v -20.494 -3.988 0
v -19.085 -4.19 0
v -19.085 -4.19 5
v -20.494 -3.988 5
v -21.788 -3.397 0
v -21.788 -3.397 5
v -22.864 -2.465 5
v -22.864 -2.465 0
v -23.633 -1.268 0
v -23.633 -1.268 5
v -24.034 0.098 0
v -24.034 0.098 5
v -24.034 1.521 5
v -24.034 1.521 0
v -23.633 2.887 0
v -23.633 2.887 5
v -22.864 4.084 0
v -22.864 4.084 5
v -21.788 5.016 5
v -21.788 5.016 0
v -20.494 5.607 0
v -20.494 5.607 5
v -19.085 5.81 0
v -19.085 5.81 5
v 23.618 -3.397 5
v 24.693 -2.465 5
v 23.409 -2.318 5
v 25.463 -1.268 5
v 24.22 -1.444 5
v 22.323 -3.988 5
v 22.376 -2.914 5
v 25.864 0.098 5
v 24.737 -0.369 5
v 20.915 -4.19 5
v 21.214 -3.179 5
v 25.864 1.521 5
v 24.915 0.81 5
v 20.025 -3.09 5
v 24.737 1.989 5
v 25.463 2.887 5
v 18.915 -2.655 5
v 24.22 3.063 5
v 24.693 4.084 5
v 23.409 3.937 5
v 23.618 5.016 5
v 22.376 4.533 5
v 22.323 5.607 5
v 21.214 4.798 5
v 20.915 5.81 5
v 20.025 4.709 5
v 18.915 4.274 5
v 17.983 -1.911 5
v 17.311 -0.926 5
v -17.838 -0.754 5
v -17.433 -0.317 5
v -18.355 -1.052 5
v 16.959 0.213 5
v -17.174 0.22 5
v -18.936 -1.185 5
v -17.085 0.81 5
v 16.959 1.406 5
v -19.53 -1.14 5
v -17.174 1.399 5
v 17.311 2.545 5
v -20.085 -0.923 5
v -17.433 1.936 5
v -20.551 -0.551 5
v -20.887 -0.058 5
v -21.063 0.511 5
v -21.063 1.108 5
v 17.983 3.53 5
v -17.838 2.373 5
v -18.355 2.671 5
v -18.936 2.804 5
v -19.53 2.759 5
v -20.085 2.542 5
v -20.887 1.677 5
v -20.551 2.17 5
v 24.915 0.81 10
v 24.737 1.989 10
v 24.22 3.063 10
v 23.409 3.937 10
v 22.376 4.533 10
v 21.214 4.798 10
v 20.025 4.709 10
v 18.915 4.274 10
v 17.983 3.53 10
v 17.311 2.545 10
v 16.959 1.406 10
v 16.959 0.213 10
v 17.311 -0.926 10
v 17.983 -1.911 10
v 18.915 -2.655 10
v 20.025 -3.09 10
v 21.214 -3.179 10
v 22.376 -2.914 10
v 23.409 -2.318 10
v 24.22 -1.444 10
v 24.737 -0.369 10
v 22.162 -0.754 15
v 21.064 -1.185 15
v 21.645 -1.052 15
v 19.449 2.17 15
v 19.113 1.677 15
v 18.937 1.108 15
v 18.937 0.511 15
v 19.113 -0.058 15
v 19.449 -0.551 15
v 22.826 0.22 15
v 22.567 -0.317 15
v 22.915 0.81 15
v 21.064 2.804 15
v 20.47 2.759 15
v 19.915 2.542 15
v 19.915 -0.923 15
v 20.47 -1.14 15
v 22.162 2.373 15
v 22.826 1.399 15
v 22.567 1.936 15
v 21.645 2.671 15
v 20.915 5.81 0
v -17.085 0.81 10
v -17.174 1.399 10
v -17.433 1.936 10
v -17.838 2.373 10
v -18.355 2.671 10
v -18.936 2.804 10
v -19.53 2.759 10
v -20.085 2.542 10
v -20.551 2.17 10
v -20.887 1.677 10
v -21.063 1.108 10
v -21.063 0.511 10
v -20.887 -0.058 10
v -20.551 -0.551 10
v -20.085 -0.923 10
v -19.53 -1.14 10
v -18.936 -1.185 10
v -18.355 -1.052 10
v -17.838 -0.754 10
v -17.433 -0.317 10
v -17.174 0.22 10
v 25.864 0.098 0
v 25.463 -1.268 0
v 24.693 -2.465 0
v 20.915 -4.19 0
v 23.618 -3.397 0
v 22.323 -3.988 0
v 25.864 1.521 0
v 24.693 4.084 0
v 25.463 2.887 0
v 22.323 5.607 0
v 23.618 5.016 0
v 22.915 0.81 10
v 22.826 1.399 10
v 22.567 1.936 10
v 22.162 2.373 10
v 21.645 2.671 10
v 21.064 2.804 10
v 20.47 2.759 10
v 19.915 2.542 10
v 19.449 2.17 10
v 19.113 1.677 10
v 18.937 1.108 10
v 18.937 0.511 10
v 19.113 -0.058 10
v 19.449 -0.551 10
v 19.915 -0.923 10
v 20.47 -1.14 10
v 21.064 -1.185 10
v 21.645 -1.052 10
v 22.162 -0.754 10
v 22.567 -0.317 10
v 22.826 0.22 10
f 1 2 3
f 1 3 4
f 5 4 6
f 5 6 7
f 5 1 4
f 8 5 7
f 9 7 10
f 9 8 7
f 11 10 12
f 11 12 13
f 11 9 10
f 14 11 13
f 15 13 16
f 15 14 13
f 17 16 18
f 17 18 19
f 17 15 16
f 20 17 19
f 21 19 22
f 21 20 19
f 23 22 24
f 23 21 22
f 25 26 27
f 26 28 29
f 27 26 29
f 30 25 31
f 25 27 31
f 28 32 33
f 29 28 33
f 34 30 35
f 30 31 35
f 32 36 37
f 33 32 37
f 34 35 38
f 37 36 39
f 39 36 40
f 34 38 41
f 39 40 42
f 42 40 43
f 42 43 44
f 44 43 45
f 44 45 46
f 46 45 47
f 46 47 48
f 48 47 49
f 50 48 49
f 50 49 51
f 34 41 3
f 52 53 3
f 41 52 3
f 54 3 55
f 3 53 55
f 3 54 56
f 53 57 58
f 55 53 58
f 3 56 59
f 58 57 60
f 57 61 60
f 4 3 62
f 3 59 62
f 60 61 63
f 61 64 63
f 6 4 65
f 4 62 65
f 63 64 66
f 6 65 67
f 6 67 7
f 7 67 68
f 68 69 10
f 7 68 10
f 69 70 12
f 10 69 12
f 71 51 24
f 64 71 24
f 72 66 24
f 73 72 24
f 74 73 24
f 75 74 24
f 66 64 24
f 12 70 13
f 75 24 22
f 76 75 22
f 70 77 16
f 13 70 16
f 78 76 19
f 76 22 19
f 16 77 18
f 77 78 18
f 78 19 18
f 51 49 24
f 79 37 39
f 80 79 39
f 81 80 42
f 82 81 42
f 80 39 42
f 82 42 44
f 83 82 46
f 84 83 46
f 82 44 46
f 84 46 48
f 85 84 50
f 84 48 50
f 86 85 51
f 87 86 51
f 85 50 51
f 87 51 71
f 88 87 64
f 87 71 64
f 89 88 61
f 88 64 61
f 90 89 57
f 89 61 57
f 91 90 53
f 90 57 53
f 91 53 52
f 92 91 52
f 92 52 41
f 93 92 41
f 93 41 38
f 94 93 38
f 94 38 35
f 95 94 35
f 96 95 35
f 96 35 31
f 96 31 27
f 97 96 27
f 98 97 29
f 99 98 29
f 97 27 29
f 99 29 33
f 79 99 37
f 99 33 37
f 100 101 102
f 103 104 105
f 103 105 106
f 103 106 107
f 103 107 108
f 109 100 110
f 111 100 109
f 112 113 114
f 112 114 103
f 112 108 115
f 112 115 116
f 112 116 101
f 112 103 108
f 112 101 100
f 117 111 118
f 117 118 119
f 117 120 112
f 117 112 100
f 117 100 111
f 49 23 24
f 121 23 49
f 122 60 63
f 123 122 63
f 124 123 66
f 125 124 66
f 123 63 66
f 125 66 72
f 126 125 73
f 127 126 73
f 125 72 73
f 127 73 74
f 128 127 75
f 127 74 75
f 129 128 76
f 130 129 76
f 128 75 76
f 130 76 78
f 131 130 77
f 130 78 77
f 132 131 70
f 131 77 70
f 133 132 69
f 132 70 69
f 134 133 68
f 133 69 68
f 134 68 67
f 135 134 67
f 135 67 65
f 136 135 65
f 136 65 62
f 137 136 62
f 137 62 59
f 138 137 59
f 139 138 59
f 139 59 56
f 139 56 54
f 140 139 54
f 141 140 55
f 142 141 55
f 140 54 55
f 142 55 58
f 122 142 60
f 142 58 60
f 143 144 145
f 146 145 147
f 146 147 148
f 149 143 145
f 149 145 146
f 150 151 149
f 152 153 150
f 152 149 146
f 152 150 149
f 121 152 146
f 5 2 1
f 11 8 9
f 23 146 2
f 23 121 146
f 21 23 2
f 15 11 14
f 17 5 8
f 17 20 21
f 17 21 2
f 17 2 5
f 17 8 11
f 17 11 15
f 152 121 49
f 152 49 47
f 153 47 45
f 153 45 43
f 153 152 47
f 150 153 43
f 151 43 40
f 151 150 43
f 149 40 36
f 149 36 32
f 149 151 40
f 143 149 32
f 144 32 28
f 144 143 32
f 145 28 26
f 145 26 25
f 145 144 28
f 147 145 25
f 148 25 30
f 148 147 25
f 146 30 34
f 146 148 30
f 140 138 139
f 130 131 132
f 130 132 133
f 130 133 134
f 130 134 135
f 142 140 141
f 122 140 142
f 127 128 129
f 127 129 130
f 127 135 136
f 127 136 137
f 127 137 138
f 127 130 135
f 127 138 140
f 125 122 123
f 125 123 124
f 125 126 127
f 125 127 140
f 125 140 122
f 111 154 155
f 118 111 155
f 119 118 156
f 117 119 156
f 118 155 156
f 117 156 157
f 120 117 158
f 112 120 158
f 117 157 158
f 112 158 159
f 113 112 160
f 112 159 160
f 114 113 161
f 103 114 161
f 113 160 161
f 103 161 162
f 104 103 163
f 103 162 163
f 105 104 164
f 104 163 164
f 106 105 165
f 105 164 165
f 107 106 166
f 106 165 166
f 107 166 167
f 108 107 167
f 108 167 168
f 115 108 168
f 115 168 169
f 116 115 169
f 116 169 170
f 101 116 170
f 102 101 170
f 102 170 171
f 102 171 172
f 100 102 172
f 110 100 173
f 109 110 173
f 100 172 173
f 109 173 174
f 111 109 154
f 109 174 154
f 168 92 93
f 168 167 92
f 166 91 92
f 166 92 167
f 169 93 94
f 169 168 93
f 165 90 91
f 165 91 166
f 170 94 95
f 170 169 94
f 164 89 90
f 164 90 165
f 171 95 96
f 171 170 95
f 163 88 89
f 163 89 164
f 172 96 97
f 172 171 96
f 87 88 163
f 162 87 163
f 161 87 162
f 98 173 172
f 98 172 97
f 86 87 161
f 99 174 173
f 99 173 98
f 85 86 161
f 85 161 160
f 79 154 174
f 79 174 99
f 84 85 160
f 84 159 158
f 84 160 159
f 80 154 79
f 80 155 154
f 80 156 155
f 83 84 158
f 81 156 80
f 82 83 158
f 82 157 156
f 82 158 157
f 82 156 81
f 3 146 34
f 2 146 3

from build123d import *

# Parameters (mm, degrees)
SALIENTE_EXTRUIR1_DEPTH = 5
CROQUIS2_R              = 2
CROQUIS2_R_2            = 4
SALIENTE_EXTRUIR2_DEPTH = 5
CROQUIS3_R              = 2
SALIENTE_EXTRUIR3_DEPTH = 5


with BuildPart() as part:
    # Croquis1 → Saliente-Extruir1 (new body)
    with BuildSketch(Plane.XY):
        with BuildLine():
            Line((-19.085254299, 5.80952381), (20.914745701, 5.80952381))
            ThreePointArc((20.914745701, 5.80952381), (25.914745701, 0.80952381), (20.914745701, -4.19047619))
            Line((20.914745701, -4.19047619), (-19.085254299, -4.19047619))
            ThreePointArc((-19.085254299, -4.19047619), (-24.085254299, 0.80952381), (-19.085254299, 5.80952381))
        make_face()
    extrude(amount=SALIENTE_EXTRUIR1_DEPTH)

    # Croquis2 → Saliente-Extruir2 (add)
    with BuildSketch(Plane.XY.offset(5)):
        with Locations((-19.085254299, 0.80952381)):
            Circle(CROQUIS2_R)
        with Locations((20.914745701, 0.80952381)):
            Circle(CROQUIS2_R_2)
    extrude(amount=SALIENTE_EXTRUIR2_DEPTH)

    # Croquis3 → Saliente-Extruir3 (add)
    with BuildSketch(Plane.XY.offset(10)):
        with Locations((20.914745701, 0.80952381)):
            Circle(CROQUIS3_R)
    extrude(amount=SALIENTE_EXTRUIR3_DEPTH)


solid = part.part
